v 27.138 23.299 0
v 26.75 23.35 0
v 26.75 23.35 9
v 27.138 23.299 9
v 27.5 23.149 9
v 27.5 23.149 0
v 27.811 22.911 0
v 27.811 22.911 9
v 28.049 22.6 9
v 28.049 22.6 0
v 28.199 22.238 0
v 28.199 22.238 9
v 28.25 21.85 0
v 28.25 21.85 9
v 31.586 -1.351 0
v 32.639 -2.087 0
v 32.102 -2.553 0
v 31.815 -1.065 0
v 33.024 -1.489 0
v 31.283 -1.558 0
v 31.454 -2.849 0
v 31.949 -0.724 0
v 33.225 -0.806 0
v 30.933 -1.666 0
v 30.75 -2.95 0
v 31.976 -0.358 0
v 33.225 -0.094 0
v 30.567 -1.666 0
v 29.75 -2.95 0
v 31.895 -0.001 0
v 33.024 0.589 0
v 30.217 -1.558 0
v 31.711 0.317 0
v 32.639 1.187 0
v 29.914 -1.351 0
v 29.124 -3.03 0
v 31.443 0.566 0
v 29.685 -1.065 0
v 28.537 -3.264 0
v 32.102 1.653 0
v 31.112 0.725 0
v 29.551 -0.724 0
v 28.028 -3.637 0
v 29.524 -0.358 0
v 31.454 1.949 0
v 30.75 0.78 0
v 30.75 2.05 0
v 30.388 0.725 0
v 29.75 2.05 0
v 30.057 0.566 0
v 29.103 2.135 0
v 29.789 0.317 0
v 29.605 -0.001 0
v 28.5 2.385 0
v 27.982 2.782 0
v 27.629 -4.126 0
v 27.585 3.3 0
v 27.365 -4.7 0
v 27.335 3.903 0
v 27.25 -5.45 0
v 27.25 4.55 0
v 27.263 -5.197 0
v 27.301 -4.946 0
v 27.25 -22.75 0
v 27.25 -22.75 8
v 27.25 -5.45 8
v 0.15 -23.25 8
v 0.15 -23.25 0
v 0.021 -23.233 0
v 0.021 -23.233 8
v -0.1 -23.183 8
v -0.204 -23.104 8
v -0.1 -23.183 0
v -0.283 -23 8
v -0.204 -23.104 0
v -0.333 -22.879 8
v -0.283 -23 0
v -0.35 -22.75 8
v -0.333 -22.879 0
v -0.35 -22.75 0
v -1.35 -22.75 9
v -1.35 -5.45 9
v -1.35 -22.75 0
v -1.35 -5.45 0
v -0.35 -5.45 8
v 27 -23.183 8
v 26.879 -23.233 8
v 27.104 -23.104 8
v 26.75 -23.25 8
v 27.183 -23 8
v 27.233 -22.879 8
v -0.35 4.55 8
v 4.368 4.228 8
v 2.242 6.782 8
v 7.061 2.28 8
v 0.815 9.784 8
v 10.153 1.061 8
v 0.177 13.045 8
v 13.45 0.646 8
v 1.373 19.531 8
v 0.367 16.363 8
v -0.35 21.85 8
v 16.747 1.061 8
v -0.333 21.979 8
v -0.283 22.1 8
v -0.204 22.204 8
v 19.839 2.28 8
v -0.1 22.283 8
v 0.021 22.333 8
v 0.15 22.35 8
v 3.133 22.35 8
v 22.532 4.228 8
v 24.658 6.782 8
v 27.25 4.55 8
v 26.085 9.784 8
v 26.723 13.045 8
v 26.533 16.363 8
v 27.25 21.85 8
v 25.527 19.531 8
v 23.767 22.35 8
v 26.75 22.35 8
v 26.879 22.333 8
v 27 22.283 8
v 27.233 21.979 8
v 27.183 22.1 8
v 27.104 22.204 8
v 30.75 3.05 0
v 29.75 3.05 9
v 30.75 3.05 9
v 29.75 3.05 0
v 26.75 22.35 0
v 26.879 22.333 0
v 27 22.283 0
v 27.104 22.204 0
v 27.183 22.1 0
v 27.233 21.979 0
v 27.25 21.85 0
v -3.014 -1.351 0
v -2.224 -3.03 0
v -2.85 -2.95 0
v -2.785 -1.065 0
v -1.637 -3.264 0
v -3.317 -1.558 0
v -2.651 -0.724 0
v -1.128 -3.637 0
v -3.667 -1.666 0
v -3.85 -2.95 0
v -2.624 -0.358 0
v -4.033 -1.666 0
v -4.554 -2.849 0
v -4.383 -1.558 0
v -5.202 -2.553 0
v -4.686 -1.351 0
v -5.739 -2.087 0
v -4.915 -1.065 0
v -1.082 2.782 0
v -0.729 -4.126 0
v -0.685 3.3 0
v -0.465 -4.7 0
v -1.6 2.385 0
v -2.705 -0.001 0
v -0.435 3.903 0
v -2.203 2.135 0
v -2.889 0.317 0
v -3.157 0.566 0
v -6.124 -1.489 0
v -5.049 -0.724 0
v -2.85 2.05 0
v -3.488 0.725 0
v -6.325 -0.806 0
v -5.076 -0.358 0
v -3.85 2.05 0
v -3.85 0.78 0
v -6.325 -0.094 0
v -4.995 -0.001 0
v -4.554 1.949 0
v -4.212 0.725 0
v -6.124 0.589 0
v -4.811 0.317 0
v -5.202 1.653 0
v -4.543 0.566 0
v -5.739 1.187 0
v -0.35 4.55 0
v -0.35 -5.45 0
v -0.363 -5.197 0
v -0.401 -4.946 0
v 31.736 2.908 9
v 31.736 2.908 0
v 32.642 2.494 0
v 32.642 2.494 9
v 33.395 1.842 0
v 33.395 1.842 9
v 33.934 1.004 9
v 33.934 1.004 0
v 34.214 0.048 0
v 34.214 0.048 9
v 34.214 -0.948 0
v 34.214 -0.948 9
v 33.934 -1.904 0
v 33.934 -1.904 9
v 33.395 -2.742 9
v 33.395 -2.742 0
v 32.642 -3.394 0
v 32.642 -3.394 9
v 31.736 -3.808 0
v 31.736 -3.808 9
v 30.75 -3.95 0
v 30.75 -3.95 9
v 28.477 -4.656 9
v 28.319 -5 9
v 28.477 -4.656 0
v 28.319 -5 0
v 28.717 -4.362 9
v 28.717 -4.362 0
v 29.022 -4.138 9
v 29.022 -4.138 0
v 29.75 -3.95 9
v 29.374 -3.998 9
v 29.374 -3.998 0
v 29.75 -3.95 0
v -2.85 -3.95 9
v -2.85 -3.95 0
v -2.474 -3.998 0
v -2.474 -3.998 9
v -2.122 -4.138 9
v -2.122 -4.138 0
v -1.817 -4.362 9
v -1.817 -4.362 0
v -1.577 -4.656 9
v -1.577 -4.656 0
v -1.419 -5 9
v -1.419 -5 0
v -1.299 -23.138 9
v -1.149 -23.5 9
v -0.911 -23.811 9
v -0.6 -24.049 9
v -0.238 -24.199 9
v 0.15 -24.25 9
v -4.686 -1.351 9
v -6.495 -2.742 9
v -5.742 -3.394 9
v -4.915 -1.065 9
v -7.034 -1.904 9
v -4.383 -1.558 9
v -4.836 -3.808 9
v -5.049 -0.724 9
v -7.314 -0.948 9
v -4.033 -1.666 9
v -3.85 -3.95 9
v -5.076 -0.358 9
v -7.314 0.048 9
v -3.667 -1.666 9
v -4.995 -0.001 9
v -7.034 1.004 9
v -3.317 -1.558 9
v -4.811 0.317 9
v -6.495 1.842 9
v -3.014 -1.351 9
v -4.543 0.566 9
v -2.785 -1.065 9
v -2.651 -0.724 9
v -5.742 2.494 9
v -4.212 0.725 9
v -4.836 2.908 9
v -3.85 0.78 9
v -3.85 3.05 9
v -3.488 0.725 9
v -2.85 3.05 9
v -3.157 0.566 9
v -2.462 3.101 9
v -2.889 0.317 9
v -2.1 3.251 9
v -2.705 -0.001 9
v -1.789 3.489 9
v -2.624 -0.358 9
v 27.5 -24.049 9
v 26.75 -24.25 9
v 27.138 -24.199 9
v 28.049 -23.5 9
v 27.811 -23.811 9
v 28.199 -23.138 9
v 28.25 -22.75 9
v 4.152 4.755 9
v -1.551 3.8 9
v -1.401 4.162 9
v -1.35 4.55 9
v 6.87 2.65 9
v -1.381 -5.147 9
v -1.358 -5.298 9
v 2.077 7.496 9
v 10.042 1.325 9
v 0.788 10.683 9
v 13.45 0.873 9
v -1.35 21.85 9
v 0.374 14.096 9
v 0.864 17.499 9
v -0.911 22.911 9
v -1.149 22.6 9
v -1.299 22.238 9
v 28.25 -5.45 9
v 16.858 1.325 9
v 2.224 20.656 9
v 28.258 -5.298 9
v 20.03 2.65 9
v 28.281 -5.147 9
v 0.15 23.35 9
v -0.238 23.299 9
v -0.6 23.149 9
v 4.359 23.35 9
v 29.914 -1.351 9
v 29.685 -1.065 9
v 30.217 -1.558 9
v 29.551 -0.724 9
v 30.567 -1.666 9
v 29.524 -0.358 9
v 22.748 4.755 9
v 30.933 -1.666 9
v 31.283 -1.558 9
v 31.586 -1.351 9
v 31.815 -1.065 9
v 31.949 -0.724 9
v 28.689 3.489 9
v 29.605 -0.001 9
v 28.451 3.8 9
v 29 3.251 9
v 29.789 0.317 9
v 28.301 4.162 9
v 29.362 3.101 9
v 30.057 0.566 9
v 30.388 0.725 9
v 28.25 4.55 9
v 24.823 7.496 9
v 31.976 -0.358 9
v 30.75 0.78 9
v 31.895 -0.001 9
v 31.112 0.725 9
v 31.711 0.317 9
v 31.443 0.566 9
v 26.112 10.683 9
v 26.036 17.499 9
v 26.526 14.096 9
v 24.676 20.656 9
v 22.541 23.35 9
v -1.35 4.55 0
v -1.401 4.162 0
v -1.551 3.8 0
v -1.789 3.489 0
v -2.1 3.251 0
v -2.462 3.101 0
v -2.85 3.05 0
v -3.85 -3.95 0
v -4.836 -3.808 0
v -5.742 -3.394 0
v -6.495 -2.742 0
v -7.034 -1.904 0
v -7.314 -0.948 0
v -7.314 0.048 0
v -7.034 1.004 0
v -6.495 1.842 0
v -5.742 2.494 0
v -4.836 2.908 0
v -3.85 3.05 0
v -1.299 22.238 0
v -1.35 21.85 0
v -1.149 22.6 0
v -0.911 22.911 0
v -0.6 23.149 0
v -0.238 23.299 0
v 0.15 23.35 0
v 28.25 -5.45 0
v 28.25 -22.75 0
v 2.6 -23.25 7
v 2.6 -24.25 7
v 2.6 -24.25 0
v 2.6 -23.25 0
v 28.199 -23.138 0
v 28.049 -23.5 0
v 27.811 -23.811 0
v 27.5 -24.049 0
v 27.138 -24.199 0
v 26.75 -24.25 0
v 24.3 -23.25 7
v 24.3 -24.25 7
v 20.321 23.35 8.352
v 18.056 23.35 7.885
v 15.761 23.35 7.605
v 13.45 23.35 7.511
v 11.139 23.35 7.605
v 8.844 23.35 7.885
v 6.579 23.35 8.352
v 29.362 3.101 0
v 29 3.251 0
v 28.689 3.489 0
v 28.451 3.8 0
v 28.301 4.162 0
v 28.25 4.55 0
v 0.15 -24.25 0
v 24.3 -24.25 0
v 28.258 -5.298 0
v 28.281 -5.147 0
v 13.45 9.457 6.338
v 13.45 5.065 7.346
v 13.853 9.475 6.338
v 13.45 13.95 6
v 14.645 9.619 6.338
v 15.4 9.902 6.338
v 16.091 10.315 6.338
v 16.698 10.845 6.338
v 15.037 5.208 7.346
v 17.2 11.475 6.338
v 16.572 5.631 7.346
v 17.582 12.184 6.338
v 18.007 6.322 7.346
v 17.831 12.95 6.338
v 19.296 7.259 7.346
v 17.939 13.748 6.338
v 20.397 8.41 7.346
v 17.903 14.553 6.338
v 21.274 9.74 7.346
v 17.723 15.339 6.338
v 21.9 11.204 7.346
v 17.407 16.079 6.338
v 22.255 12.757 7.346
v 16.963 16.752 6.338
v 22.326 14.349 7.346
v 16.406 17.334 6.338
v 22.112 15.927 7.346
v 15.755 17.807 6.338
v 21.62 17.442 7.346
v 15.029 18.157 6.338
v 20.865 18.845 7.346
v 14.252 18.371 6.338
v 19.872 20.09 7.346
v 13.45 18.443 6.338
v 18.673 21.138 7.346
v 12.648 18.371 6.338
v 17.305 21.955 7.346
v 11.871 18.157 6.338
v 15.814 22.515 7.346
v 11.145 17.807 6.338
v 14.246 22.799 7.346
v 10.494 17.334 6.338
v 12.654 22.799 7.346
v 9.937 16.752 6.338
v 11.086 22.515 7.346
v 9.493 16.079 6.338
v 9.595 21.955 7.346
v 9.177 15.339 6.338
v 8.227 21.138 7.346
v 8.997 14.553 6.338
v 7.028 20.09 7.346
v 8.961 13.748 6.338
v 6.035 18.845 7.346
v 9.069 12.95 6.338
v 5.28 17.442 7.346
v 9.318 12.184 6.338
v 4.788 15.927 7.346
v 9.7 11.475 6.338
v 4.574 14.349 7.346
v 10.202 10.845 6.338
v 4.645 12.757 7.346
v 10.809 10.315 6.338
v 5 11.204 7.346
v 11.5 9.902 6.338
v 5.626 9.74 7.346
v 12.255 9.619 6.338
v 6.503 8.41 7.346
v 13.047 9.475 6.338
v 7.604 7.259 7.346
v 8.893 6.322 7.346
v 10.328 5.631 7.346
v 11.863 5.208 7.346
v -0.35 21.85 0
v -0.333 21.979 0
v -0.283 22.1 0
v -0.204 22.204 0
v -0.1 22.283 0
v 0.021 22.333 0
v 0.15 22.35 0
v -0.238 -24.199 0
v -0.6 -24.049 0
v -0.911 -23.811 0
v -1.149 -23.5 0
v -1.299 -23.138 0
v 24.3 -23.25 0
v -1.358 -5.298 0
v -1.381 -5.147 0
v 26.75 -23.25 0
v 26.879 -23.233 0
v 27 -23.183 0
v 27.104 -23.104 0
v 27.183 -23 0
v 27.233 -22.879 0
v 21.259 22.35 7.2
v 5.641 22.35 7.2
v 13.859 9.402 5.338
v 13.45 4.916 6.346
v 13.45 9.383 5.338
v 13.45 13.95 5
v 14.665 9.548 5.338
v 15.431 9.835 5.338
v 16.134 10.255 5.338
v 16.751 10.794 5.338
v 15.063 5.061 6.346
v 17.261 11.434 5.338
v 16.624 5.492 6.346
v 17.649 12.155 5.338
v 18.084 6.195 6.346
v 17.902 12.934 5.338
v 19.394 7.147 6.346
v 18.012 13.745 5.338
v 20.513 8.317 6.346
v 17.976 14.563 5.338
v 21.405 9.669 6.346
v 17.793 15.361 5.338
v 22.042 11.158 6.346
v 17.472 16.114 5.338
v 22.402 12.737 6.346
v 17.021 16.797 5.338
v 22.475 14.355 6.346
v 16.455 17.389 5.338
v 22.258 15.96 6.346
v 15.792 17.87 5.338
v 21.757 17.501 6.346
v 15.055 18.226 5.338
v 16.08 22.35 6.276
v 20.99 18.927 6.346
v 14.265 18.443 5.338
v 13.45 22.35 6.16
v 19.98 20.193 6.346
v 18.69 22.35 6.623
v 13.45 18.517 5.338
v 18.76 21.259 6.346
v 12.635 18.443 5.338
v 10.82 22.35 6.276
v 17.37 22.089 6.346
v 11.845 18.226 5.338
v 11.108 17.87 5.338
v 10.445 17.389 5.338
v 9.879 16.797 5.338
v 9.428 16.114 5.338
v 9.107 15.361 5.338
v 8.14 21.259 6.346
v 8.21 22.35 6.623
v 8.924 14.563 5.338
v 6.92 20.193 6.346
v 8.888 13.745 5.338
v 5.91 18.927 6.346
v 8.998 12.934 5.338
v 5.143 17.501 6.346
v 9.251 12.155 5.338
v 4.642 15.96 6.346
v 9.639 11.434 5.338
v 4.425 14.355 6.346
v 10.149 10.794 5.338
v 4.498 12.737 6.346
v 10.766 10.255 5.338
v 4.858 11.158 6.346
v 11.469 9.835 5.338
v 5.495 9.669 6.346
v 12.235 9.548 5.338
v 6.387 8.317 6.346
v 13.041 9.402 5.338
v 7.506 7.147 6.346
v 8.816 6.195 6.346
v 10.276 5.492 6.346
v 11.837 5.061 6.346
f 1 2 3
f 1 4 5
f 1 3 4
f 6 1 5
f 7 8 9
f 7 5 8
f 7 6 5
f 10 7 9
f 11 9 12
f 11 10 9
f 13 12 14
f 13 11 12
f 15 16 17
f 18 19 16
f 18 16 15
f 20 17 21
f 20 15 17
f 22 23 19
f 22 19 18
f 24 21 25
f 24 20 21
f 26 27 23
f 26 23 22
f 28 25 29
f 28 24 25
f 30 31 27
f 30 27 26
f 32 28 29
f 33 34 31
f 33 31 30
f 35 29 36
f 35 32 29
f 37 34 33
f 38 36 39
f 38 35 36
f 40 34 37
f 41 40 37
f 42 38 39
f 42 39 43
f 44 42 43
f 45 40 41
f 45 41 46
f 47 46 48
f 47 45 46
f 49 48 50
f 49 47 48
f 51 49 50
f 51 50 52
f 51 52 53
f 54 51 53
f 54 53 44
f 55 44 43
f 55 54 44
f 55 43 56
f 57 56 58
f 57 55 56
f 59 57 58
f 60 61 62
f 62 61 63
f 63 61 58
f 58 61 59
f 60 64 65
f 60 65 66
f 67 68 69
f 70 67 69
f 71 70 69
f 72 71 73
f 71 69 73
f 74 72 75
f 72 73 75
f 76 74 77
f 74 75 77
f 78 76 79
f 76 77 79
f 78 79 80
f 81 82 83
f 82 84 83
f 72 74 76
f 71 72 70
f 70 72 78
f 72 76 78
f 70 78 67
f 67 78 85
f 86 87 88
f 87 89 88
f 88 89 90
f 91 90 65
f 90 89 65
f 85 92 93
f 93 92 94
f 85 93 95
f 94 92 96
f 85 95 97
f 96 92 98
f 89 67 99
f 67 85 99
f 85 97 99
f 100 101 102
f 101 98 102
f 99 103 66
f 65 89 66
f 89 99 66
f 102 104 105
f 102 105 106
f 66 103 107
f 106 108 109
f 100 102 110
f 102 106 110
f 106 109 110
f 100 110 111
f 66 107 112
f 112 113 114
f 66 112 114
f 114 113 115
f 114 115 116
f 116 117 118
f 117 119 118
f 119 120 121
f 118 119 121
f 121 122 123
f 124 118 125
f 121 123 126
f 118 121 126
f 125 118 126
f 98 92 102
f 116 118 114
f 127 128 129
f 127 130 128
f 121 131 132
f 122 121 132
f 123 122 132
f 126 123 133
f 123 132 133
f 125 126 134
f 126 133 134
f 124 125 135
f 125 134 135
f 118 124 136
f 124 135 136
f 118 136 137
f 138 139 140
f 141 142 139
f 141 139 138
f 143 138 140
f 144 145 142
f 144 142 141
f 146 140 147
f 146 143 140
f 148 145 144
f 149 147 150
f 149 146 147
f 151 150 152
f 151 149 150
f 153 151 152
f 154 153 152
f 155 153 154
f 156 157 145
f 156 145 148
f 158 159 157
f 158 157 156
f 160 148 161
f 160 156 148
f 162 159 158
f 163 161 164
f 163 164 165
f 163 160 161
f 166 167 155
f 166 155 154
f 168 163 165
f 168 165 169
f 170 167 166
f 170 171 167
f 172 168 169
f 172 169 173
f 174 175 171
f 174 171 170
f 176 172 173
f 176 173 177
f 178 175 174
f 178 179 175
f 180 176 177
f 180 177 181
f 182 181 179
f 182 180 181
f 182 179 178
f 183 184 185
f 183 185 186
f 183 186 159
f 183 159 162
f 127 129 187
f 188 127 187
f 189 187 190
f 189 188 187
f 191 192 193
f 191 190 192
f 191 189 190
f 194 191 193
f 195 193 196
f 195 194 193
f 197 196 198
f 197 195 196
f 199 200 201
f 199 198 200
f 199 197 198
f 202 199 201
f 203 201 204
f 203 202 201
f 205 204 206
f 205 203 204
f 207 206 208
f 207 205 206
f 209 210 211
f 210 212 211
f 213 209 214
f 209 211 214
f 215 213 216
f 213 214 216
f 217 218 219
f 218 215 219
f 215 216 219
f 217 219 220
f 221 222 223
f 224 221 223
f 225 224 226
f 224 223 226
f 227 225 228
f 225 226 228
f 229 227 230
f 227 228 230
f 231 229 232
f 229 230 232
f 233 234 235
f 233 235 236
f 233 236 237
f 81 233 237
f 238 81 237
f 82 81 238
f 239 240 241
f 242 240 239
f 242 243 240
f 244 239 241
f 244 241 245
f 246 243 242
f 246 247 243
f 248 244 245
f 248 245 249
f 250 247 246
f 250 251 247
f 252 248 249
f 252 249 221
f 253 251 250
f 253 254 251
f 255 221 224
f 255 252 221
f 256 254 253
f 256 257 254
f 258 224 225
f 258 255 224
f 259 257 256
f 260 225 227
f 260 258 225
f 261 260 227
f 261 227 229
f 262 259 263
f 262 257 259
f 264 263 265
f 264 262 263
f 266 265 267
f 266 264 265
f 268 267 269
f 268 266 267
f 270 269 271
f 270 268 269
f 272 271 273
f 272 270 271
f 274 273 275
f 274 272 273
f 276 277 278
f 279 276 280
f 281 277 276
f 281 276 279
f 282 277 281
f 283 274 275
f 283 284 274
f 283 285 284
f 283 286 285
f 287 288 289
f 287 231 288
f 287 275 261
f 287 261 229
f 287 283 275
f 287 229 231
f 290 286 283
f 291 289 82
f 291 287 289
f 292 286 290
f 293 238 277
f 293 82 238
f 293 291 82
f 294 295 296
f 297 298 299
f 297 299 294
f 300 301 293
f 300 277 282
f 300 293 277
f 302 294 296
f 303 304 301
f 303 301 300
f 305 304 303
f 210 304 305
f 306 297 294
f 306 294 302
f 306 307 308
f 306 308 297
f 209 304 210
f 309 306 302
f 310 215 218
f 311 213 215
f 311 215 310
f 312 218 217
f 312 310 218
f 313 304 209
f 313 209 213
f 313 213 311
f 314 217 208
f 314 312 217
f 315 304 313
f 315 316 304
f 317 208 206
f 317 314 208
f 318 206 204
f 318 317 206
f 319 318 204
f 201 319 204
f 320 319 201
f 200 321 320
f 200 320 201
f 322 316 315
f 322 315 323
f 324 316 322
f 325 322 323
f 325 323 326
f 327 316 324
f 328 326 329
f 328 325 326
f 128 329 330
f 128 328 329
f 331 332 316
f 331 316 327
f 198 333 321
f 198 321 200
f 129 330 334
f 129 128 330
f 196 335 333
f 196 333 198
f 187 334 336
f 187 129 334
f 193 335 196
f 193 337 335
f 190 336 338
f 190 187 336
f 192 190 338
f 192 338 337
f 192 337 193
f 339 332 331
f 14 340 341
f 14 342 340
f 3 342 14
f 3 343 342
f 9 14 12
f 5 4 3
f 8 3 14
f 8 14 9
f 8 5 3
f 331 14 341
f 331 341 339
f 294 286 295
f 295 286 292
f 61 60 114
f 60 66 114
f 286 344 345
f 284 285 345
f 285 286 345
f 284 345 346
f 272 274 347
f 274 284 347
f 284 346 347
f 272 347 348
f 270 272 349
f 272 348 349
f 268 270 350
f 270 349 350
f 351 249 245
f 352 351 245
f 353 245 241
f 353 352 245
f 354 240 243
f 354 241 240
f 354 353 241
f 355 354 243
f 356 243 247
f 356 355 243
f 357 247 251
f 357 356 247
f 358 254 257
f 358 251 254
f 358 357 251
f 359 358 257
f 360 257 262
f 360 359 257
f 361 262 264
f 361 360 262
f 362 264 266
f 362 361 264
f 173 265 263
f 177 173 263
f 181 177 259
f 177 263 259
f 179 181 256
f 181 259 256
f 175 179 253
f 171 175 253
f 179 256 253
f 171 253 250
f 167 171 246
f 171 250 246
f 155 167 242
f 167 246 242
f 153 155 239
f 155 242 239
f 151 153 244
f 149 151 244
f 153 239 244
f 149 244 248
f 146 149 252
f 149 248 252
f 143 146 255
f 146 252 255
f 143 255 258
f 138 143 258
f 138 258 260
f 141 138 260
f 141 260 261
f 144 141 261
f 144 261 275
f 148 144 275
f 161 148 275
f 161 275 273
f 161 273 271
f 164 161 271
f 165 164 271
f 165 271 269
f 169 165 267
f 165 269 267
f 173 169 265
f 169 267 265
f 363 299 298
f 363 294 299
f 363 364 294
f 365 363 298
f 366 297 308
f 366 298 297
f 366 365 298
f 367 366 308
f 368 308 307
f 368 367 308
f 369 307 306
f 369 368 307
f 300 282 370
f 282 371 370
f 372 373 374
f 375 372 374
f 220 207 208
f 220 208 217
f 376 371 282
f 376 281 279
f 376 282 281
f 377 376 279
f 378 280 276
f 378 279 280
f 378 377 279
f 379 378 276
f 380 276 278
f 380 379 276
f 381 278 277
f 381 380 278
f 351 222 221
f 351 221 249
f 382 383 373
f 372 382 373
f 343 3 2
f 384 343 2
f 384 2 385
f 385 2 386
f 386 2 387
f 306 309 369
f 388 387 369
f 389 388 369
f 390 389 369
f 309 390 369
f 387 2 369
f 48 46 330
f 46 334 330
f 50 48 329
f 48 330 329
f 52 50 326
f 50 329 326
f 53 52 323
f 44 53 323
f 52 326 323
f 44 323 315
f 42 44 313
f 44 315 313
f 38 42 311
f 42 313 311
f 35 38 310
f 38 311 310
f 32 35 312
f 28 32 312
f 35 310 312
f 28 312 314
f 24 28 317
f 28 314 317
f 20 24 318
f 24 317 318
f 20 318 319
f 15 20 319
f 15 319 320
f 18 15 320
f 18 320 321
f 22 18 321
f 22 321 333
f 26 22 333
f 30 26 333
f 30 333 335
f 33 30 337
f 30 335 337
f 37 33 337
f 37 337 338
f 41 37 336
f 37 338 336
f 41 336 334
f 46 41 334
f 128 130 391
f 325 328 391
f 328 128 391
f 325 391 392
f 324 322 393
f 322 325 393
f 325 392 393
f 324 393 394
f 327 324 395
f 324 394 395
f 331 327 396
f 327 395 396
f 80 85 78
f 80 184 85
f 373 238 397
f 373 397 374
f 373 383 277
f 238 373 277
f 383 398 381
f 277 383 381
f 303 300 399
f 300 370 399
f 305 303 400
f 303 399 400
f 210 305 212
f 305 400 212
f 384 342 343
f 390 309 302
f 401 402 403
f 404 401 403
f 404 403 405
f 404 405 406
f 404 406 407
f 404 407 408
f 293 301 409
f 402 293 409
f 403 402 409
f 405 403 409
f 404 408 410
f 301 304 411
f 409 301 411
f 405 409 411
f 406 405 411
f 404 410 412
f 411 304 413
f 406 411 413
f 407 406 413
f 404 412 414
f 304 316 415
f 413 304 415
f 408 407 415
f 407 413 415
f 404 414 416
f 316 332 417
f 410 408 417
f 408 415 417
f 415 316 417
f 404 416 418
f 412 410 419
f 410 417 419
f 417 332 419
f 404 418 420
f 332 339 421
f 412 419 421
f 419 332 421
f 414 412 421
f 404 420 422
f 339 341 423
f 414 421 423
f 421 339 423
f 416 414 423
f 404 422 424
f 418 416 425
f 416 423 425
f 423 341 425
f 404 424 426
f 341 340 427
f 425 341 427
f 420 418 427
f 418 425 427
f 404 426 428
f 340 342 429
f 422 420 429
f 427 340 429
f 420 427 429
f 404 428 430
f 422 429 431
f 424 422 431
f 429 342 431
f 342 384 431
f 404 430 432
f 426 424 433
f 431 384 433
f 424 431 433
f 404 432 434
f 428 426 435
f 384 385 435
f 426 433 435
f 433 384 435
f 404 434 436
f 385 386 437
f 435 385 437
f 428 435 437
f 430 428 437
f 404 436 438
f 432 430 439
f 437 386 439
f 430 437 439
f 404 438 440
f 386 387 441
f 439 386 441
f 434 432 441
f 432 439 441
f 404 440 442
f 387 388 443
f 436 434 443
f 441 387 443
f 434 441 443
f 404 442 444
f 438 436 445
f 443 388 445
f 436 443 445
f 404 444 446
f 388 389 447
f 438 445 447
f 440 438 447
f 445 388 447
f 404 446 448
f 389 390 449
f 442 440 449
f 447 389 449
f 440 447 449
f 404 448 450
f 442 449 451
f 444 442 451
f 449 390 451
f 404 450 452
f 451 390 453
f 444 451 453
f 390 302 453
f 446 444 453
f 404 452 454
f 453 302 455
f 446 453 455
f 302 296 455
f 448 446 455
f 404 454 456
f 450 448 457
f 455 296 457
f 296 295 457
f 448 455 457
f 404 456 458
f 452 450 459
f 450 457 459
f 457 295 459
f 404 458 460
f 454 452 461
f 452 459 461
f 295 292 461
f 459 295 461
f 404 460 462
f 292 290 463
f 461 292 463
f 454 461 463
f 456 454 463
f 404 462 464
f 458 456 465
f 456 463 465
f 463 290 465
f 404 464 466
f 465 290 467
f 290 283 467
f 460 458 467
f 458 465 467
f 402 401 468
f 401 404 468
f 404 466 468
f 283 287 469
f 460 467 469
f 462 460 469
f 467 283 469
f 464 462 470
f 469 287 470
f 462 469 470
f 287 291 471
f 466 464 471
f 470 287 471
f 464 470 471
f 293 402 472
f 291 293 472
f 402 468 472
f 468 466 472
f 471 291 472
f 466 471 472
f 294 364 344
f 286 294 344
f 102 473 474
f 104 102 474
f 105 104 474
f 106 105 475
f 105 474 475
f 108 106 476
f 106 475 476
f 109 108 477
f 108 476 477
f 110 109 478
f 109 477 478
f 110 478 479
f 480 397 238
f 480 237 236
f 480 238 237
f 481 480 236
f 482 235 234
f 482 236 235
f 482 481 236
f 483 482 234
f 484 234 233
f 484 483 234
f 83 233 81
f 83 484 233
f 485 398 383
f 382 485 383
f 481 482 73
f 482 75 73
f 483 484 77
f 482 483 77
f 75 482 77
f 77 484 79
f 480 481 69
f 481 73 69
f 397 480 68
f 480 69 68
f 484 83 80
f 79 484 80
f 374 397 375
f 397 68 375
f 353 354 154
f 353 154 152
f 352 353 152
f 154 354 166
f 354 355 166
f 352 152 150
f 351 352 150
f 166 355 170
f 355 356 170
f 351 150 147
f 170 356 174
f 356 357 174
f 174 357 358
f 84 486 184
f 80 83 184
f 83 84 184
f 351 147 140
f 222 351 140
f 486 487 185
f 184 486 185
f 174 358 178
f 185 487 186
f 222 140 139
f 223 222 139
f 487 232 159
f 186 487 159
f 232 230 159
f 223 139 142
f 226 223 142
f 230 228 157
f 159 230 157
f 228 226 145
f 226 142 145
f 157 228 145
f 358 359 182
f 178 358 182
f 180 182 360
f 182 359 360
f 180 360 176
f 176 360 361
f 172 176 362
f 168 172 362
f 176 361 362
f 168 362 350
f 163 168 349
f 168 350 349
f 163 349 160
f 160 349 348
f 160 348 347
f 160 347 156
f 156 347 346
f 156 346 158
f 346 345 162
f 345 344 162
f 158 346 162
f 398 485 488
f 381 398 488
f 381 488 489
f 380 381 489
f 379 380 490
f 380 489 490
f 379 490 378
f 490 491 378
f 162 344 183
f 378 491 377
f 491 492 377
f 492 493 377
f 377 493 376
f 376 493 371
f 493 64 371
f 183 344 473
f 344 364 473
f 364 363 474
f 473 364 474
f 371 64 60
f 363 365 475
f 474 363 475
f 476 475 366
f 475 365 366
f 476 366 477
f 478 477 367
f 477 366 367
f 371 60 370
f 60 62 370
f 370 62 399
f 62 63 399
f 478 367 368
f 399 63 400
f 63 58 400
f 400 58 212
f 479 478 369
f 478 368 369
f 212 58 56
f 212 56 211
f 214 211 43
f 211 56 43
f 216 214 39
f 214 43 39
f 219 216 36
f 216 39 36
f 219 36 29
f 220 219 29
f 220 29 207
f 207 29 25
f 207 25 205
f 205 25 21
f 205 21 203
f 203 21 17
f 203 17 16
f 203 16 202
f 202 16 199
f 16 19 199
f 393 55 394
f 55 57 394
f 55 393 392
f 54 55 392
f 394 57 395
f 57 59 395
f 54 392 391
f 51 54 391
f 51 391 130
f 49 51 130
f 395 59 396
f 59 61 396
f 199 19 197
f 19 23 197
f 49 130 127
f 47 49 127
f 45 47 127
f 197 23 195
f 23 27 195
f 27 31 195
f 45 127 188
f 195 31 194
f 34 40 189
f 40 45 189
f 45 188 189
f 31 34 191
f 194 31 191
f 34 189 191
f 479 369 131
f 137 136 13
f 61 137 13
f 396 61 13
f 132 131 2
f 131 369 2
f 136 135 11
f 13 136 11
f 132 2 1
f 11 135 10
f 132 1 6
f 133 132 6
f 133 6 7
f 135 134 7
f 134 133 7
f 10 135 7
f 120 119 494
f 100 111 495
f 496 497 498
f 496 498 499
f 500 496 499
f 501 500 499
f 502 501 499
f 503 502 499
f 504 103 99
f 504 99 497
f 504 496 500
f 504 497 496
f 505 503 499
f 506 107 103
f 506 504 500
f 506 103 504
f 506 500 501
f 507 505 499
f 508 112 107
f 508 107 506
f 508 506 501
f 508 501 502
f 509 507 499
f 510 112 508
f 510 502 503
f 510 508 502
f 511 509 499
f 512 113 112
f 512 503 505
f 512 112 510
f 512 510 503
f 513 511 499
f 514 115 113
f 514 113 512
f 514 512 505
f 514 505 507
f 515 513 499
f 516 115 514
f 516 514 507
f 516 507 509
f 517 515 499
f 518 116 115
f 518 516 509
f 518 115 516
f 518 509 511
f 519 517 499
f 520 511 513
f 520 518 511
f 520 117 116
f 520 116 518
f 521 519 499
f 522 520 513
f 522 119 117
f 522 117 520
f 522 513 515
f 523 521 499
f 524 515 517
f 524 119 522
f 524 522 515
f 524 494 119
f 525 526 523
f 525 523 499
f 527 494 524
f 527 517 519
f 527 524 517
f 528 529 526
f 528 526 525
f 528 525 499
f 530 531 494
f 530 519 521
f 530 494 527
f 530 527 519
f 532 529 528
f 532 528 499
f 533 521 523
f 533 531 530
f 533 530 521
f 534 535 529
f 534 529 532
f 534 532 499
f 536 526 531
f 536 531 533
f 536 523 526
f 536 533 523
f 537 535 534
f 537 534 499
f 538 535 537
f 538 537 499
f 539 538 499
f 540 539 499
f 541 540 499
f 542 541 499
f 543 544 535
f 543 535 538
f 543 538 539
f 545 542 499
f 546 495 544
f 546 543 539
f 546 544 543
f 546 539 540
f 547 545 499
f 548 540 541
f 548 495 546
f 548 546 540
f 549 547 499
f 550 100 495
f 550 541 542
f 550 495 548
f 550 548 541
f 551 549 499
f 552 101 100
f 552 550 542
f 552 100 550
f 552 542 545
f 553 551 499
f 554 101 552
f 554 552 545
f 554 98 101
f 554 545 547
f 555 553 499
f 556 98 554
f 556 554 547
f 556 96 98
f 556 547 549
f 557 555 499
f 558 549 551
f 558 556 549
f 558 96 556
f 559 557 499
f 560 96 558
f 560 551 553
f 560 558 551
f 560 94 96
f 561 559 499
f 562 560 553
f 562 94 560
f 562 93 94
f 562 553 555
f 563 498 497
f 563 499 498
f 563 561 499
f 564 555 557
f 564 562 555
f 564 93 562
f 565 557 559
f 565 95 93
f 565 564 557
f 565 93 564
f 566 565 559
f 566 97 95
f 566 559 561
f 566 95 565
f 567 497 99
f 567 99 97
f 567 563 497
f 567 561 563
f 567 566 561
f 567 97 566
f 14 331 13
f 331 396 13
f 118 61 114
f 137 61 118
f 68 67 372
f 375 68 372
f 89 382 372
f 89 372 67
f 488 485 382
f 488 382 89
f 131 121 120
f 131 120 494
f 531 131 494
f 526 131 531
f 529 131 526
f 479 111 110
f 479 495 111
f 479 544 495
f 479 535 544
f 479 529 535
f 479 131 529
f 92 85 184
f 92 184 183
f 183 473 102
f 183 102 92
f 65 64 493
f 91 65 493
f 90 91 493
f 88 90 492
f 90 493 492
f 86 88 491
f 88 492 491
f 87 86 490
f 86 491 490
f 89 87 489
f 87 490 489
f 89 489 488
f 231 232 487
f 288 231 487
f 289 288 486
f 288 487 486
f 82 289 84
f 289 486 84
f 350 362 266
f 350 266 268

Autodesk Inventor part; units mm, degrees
ref_plane "YZ Plane" through (0, 0, 0) normal (1, 0, 0) x (0, 1, 0)
ref_plane "XZ Plane" through (0, 0, 0) normal (0, 1, 0) x (-1, 0, 0)
ref_plane "XY Plane" through (0, 0, 0) normal (0, 0, 1) x (1, 0, 0)
sketch "Sketch1" plane through (0, 0, 0) normal (0, 0, 1) x (1, 0, 0)
  arc A0 (-3.85, 3.05) -> (-3.85, -3.95) centre (-3.85, -0.45) ccw projected
  arc A1 (-1.4191, -5) -> (-2.85, -3.95) centre (-2.85, -5.45) ccw projected
  line L0 (-2.85, -3.95) -> (-3.85, -3.95) projected
  arc A2 (-1.35, -5.45) -> (-1.4191, -5) centre (-2.85, -5.45) ccw projected
  line L1 (-1.35, -5.45) -> (-1.35, -6) projected
  line L2 (-1.35, -6) -> (-1.35, -14.05) projected
  line L3 (-1.35, -14.05) -> (-1.35, -15.05) projected
  line L4 (-1.35, -15.05) -> (-1.35, -22.75) projected
  arc A3 (-1.35, -22.75) -> (0.15, -24.25) centre (0.15, -22.75) ccw projected
  line L5 (0.15, -24.25) -> (2.6, -24.25) projected
  line L6 (24.3, -24.25) -> (2.6, -24.25) projected
  line L7 (24.3, -24.25) -> (26.75, -24.25) projected
  arc A4 (26.75, -24.25) -> (28.25, -22.75) centre (26.75, -22.75) ccw projected
  line L8 (28.25, -22.75) -> (28.25, -15.05) projected
  line L9 (28.25, -15.05) -> (28.25, -14.05) projected
  line L10 (28.25, -14.05) -> (28.25, -6) projected
  line L11 (28.25, -6) -> (28.25, -5.45) projected
  arc A5 (28.3191, -5) -> (28.25, -5.45) centre (29.75, -5.45) ccw projected
  arc A6 (29.75, -3.95) -> (28.3191, -5) centre (29.75, -5.45) ccw projected
  arc A7 (30.75, -3.95) -> (30.75, 3.05) centre (30.75, -0.45) ccw projected
  line L12 (30.75, -3.95) -> (29.75, -3.95) projected
  line L13 (29.75, 3.05) -> (30.75, 3.05) projected
  arc A8 (28.25, 4.55) -> (29.75, 3.05) centre (29.75, 4.55) ccw projected
  line L14 (28.25, 4.55) -> (28.25, 5) projected
  line L15 (28.25, 5) -> (28.25, 6) projected
  line L16 (28.25, 6) -> (28.25, 21.85) projected
  arc A9 (28.25, 21.85) -> (26.75, 23.35) centre (26.75, 21.85) ccw projected
  line L17 (25.45, 23.35) -> (26.55, 23.35) projected
  line L18 (26.75, 23.35) -> (26.55, 23.35) projected
  line L19 (0.35, 23.35) -> (0.15, 23.35) projected
  arc A10 (0.15, 23.35) -> (-1.35, 21.85) centre (0.15, 21.85) ccw projected
  line L20 (0.35, 23.35) -> (1.45, 23.35) projected
  line L21 (-1.35, 5) -> (-1.35, 21.15) projected
  line L22 (-1.35, 21.85) -> (-1.35, 21.15) projected
  line L23 (-1.35, 5) -> (-1.35, 4.55) projected
  arc A11 (-2.85, 3.05) -> (-1.35, 4.55) centre (-2.85, 4.55) ccw projected
  line L24 (-3.85, 3.05) -> (-2.85, 3.05) projected
  line L25 (1.45, 23.35) -> (25.45, 23.35)
  point P0 (0, 0)
extrude "Extrusion1" add sketch "Sketch1" along normal blind 9
ref_plane "Work Plane1" through (13.45, 4.55, 0) normal (-1, 0, 0) x (0, 0, 1)
sketch "Sketch2" plane through (13.45, 4.55, 0) normal (-1, 0, 0) x (0, 0, 1)
  line L0 (9, -8.5) -> (9, -1.5) projected
  circle A0 centre (36, 9.4) radius 30
  line L1 (9, 9.4) -> (36, 9.4)
  line L2 (36, 9.4) -> (66, 9.4)
  line L3 (9, 9.4) -> (6, 9.4)
  line L4 (-3, 9.8) -> (-3, 9) projected
  line L5 (9, -1.5) -> (9, -8.5) projected
  line L6 (9, -8.5) -> (9, -10) projected
  line L7 (9, -10) -> (9, -27.3) projected
  line L8 (9, -27.3) -> (9, -28.8) projected
  line L9 (9, -28.8) -> (9, -27.3) projected
  line L10 (9, -27.3) -> (9, -10) projected
  line L11 (9, -10) -> (9, -8.5) projected
  line L12 (9, -8.5) -> (9, -1.5) projected
  line L13 (9, -1.5) -> (9, 0) projected
  line L14 (9, 0) -> (9, 17.3) projected
  line L15 (9, 17.3) -> (9, 18.8) projected
  line L16 (9, 18.8) -> (9, 17.3) projected
  line L17 (9, 17.3) -> (9, 0) projected
  line L18 (9, 0) -> (9, -1.5) projected
  line L19 (9, 9.4) -> (-3, 9.4)
  point P0 (0, -4.55)
  dimension "d2" = 60
  dimension "d3" = 27
revolve "Revolution1" cut sketch "Sketch2" angle 360 about axis through (13.45, 13.95, 9) along (0, 0, 1) contours A0 L3 L14 L13 L0 | L0 L13 L14 L1 L2 A0
shell "Shell1" thickness 1 removed faces 1 at (9.0167, -11.7167, 0)
sketch "Sketch4" plane through (26.75, 22.35, 8) normal (0, 0, -1) x (-1, 0, 0)
  arc A0 (2.983, 0) -> (23.617, 0) centre (13.3, -8.4) ccw projected
  arc A1 (30.6, -25.3) -> (30.6, -20.3) centre (30.6, -22.8) ccw projected
  line L0 (29.6, -20.3) -> (30.6, -20.3) projected
  arc A2 (27.1, -17.8) -> (29.6, -20.3) centre (29.6, -17.8) ccw projected
  line L1 (27.1, -0.5) -> (27.1, -17.8) projected
  arc A3 (27.1, -0.5) -> (26.6, 0) centre (26.6, -0.5) ccw projected
  line L2 (23.617, 0) -> (26.6, 0) projected
  arc A4 (0, 0) -> (-0.5, -0.5) centre (0, -0.5) ccw projected
  line L3 (-0.5, -17.8) -> (-0.5, -0.5) projected
  arc A5 (-3, -20.3) -> (-0.5, -17.8) centre (-3, -17.8) ccw projected
  line L4 (-4, -20.3) -> (-3, -20.3) projected
  arc A6 (-4, -20.3) -> (-4, -25.3) centre (-4, -22.8) ccw projected
  line L5 (-3, -25.3) -> (-4, -25.3) projected
  arc A7 (-0.5, -27.8) -> (-3, -25.3) centre (-3, -27.8) ccw projected
  line L6 (-0.5, -45.1) -> (-0.5, -27.8) projected
  arc A8 (-0.5, -45.1) -> (0, -45.6) centre (0, -45.1) ccw projected
  line L7 (26.6, -45.6) -> (0, -45.6) projected
  arc A9 (26.6, -45.6) -> (27.1, -45.1) centre (26.6, -45.1) ccw projected
  line L8 (27.1, -27.8) -> (27.1, -45.1) projected
  arc A10 (29.6, -25.3) -> (27.1, -27.8) centre (29.6, -27.8) ccw projected
  line L9 (30.6, -25.3) -> (29.6, -25.3) projected
  line L10 (-0.5, -27.8) -> (-0.5, -17.8)
  line L11 (27.1, -27.8) -> (27.1, -17.8)
  line L12 (0, 0) -> (2.983, 0) projected
  point P0 (26.75, -22.35)
extrude "Extrusion2" add sketch "Sketch4" along normal up to surface (8 mm away) contours L10 A7 L5 A6 L4 A5 | A2 L0 A1 L9 A10 L11
sketch "Sketch5" plane through (0, 0, 0) normal (0, 0, -1) x (-1, 0, 0)
  circle A0 centre (-30.75, -0.45) radius 1.7 projected
  circle A1 centre (3.85, -0.45) radius 1.7 projected
  point P0 (0, 0)
hole "Hole1" at (30.75, -0.45, 0) at (-3.85, -0.45, 0) direction (0, 0, 1) diameter 2.459 end through all thread size "M3x0.5" class "6H" standard "ANSI Metric M Profile"
sketch "Sketch6" plane through (0.15, -24.25, 0) normal (0, -1, 0) x (1, 0, 0)
  line L0 (0, 0) -> (26.6, 0) projected
  line L1 (26.6, 0) -> (26.6, 9) projected
  line L2 (0, 9) -> (26.6, 9) projected
  line L3 (0, 0) -> (0, 9) projected
  line L4 (2.45, -3) -> (2.45, 0) projected
  line L5 (24.15, -3) -> (24.15, 0) projected
  line L6 (2.45, 0) -> (24.15, 0)
  line L7 (24.15, 0) -> (24.15, 7)
  line L8 (24.15, 7) -> (2.45, 7)
  line L9 (2.45, 7) -> (2.45, 0)
  point P0 (-0.15, 0)
  dimension "d15" = 2
extrude "Extrusion3" cut sketch "Sketch6" against normal blind 9 contours L9 L8 L7 L0
properties part number "SphereMount"
